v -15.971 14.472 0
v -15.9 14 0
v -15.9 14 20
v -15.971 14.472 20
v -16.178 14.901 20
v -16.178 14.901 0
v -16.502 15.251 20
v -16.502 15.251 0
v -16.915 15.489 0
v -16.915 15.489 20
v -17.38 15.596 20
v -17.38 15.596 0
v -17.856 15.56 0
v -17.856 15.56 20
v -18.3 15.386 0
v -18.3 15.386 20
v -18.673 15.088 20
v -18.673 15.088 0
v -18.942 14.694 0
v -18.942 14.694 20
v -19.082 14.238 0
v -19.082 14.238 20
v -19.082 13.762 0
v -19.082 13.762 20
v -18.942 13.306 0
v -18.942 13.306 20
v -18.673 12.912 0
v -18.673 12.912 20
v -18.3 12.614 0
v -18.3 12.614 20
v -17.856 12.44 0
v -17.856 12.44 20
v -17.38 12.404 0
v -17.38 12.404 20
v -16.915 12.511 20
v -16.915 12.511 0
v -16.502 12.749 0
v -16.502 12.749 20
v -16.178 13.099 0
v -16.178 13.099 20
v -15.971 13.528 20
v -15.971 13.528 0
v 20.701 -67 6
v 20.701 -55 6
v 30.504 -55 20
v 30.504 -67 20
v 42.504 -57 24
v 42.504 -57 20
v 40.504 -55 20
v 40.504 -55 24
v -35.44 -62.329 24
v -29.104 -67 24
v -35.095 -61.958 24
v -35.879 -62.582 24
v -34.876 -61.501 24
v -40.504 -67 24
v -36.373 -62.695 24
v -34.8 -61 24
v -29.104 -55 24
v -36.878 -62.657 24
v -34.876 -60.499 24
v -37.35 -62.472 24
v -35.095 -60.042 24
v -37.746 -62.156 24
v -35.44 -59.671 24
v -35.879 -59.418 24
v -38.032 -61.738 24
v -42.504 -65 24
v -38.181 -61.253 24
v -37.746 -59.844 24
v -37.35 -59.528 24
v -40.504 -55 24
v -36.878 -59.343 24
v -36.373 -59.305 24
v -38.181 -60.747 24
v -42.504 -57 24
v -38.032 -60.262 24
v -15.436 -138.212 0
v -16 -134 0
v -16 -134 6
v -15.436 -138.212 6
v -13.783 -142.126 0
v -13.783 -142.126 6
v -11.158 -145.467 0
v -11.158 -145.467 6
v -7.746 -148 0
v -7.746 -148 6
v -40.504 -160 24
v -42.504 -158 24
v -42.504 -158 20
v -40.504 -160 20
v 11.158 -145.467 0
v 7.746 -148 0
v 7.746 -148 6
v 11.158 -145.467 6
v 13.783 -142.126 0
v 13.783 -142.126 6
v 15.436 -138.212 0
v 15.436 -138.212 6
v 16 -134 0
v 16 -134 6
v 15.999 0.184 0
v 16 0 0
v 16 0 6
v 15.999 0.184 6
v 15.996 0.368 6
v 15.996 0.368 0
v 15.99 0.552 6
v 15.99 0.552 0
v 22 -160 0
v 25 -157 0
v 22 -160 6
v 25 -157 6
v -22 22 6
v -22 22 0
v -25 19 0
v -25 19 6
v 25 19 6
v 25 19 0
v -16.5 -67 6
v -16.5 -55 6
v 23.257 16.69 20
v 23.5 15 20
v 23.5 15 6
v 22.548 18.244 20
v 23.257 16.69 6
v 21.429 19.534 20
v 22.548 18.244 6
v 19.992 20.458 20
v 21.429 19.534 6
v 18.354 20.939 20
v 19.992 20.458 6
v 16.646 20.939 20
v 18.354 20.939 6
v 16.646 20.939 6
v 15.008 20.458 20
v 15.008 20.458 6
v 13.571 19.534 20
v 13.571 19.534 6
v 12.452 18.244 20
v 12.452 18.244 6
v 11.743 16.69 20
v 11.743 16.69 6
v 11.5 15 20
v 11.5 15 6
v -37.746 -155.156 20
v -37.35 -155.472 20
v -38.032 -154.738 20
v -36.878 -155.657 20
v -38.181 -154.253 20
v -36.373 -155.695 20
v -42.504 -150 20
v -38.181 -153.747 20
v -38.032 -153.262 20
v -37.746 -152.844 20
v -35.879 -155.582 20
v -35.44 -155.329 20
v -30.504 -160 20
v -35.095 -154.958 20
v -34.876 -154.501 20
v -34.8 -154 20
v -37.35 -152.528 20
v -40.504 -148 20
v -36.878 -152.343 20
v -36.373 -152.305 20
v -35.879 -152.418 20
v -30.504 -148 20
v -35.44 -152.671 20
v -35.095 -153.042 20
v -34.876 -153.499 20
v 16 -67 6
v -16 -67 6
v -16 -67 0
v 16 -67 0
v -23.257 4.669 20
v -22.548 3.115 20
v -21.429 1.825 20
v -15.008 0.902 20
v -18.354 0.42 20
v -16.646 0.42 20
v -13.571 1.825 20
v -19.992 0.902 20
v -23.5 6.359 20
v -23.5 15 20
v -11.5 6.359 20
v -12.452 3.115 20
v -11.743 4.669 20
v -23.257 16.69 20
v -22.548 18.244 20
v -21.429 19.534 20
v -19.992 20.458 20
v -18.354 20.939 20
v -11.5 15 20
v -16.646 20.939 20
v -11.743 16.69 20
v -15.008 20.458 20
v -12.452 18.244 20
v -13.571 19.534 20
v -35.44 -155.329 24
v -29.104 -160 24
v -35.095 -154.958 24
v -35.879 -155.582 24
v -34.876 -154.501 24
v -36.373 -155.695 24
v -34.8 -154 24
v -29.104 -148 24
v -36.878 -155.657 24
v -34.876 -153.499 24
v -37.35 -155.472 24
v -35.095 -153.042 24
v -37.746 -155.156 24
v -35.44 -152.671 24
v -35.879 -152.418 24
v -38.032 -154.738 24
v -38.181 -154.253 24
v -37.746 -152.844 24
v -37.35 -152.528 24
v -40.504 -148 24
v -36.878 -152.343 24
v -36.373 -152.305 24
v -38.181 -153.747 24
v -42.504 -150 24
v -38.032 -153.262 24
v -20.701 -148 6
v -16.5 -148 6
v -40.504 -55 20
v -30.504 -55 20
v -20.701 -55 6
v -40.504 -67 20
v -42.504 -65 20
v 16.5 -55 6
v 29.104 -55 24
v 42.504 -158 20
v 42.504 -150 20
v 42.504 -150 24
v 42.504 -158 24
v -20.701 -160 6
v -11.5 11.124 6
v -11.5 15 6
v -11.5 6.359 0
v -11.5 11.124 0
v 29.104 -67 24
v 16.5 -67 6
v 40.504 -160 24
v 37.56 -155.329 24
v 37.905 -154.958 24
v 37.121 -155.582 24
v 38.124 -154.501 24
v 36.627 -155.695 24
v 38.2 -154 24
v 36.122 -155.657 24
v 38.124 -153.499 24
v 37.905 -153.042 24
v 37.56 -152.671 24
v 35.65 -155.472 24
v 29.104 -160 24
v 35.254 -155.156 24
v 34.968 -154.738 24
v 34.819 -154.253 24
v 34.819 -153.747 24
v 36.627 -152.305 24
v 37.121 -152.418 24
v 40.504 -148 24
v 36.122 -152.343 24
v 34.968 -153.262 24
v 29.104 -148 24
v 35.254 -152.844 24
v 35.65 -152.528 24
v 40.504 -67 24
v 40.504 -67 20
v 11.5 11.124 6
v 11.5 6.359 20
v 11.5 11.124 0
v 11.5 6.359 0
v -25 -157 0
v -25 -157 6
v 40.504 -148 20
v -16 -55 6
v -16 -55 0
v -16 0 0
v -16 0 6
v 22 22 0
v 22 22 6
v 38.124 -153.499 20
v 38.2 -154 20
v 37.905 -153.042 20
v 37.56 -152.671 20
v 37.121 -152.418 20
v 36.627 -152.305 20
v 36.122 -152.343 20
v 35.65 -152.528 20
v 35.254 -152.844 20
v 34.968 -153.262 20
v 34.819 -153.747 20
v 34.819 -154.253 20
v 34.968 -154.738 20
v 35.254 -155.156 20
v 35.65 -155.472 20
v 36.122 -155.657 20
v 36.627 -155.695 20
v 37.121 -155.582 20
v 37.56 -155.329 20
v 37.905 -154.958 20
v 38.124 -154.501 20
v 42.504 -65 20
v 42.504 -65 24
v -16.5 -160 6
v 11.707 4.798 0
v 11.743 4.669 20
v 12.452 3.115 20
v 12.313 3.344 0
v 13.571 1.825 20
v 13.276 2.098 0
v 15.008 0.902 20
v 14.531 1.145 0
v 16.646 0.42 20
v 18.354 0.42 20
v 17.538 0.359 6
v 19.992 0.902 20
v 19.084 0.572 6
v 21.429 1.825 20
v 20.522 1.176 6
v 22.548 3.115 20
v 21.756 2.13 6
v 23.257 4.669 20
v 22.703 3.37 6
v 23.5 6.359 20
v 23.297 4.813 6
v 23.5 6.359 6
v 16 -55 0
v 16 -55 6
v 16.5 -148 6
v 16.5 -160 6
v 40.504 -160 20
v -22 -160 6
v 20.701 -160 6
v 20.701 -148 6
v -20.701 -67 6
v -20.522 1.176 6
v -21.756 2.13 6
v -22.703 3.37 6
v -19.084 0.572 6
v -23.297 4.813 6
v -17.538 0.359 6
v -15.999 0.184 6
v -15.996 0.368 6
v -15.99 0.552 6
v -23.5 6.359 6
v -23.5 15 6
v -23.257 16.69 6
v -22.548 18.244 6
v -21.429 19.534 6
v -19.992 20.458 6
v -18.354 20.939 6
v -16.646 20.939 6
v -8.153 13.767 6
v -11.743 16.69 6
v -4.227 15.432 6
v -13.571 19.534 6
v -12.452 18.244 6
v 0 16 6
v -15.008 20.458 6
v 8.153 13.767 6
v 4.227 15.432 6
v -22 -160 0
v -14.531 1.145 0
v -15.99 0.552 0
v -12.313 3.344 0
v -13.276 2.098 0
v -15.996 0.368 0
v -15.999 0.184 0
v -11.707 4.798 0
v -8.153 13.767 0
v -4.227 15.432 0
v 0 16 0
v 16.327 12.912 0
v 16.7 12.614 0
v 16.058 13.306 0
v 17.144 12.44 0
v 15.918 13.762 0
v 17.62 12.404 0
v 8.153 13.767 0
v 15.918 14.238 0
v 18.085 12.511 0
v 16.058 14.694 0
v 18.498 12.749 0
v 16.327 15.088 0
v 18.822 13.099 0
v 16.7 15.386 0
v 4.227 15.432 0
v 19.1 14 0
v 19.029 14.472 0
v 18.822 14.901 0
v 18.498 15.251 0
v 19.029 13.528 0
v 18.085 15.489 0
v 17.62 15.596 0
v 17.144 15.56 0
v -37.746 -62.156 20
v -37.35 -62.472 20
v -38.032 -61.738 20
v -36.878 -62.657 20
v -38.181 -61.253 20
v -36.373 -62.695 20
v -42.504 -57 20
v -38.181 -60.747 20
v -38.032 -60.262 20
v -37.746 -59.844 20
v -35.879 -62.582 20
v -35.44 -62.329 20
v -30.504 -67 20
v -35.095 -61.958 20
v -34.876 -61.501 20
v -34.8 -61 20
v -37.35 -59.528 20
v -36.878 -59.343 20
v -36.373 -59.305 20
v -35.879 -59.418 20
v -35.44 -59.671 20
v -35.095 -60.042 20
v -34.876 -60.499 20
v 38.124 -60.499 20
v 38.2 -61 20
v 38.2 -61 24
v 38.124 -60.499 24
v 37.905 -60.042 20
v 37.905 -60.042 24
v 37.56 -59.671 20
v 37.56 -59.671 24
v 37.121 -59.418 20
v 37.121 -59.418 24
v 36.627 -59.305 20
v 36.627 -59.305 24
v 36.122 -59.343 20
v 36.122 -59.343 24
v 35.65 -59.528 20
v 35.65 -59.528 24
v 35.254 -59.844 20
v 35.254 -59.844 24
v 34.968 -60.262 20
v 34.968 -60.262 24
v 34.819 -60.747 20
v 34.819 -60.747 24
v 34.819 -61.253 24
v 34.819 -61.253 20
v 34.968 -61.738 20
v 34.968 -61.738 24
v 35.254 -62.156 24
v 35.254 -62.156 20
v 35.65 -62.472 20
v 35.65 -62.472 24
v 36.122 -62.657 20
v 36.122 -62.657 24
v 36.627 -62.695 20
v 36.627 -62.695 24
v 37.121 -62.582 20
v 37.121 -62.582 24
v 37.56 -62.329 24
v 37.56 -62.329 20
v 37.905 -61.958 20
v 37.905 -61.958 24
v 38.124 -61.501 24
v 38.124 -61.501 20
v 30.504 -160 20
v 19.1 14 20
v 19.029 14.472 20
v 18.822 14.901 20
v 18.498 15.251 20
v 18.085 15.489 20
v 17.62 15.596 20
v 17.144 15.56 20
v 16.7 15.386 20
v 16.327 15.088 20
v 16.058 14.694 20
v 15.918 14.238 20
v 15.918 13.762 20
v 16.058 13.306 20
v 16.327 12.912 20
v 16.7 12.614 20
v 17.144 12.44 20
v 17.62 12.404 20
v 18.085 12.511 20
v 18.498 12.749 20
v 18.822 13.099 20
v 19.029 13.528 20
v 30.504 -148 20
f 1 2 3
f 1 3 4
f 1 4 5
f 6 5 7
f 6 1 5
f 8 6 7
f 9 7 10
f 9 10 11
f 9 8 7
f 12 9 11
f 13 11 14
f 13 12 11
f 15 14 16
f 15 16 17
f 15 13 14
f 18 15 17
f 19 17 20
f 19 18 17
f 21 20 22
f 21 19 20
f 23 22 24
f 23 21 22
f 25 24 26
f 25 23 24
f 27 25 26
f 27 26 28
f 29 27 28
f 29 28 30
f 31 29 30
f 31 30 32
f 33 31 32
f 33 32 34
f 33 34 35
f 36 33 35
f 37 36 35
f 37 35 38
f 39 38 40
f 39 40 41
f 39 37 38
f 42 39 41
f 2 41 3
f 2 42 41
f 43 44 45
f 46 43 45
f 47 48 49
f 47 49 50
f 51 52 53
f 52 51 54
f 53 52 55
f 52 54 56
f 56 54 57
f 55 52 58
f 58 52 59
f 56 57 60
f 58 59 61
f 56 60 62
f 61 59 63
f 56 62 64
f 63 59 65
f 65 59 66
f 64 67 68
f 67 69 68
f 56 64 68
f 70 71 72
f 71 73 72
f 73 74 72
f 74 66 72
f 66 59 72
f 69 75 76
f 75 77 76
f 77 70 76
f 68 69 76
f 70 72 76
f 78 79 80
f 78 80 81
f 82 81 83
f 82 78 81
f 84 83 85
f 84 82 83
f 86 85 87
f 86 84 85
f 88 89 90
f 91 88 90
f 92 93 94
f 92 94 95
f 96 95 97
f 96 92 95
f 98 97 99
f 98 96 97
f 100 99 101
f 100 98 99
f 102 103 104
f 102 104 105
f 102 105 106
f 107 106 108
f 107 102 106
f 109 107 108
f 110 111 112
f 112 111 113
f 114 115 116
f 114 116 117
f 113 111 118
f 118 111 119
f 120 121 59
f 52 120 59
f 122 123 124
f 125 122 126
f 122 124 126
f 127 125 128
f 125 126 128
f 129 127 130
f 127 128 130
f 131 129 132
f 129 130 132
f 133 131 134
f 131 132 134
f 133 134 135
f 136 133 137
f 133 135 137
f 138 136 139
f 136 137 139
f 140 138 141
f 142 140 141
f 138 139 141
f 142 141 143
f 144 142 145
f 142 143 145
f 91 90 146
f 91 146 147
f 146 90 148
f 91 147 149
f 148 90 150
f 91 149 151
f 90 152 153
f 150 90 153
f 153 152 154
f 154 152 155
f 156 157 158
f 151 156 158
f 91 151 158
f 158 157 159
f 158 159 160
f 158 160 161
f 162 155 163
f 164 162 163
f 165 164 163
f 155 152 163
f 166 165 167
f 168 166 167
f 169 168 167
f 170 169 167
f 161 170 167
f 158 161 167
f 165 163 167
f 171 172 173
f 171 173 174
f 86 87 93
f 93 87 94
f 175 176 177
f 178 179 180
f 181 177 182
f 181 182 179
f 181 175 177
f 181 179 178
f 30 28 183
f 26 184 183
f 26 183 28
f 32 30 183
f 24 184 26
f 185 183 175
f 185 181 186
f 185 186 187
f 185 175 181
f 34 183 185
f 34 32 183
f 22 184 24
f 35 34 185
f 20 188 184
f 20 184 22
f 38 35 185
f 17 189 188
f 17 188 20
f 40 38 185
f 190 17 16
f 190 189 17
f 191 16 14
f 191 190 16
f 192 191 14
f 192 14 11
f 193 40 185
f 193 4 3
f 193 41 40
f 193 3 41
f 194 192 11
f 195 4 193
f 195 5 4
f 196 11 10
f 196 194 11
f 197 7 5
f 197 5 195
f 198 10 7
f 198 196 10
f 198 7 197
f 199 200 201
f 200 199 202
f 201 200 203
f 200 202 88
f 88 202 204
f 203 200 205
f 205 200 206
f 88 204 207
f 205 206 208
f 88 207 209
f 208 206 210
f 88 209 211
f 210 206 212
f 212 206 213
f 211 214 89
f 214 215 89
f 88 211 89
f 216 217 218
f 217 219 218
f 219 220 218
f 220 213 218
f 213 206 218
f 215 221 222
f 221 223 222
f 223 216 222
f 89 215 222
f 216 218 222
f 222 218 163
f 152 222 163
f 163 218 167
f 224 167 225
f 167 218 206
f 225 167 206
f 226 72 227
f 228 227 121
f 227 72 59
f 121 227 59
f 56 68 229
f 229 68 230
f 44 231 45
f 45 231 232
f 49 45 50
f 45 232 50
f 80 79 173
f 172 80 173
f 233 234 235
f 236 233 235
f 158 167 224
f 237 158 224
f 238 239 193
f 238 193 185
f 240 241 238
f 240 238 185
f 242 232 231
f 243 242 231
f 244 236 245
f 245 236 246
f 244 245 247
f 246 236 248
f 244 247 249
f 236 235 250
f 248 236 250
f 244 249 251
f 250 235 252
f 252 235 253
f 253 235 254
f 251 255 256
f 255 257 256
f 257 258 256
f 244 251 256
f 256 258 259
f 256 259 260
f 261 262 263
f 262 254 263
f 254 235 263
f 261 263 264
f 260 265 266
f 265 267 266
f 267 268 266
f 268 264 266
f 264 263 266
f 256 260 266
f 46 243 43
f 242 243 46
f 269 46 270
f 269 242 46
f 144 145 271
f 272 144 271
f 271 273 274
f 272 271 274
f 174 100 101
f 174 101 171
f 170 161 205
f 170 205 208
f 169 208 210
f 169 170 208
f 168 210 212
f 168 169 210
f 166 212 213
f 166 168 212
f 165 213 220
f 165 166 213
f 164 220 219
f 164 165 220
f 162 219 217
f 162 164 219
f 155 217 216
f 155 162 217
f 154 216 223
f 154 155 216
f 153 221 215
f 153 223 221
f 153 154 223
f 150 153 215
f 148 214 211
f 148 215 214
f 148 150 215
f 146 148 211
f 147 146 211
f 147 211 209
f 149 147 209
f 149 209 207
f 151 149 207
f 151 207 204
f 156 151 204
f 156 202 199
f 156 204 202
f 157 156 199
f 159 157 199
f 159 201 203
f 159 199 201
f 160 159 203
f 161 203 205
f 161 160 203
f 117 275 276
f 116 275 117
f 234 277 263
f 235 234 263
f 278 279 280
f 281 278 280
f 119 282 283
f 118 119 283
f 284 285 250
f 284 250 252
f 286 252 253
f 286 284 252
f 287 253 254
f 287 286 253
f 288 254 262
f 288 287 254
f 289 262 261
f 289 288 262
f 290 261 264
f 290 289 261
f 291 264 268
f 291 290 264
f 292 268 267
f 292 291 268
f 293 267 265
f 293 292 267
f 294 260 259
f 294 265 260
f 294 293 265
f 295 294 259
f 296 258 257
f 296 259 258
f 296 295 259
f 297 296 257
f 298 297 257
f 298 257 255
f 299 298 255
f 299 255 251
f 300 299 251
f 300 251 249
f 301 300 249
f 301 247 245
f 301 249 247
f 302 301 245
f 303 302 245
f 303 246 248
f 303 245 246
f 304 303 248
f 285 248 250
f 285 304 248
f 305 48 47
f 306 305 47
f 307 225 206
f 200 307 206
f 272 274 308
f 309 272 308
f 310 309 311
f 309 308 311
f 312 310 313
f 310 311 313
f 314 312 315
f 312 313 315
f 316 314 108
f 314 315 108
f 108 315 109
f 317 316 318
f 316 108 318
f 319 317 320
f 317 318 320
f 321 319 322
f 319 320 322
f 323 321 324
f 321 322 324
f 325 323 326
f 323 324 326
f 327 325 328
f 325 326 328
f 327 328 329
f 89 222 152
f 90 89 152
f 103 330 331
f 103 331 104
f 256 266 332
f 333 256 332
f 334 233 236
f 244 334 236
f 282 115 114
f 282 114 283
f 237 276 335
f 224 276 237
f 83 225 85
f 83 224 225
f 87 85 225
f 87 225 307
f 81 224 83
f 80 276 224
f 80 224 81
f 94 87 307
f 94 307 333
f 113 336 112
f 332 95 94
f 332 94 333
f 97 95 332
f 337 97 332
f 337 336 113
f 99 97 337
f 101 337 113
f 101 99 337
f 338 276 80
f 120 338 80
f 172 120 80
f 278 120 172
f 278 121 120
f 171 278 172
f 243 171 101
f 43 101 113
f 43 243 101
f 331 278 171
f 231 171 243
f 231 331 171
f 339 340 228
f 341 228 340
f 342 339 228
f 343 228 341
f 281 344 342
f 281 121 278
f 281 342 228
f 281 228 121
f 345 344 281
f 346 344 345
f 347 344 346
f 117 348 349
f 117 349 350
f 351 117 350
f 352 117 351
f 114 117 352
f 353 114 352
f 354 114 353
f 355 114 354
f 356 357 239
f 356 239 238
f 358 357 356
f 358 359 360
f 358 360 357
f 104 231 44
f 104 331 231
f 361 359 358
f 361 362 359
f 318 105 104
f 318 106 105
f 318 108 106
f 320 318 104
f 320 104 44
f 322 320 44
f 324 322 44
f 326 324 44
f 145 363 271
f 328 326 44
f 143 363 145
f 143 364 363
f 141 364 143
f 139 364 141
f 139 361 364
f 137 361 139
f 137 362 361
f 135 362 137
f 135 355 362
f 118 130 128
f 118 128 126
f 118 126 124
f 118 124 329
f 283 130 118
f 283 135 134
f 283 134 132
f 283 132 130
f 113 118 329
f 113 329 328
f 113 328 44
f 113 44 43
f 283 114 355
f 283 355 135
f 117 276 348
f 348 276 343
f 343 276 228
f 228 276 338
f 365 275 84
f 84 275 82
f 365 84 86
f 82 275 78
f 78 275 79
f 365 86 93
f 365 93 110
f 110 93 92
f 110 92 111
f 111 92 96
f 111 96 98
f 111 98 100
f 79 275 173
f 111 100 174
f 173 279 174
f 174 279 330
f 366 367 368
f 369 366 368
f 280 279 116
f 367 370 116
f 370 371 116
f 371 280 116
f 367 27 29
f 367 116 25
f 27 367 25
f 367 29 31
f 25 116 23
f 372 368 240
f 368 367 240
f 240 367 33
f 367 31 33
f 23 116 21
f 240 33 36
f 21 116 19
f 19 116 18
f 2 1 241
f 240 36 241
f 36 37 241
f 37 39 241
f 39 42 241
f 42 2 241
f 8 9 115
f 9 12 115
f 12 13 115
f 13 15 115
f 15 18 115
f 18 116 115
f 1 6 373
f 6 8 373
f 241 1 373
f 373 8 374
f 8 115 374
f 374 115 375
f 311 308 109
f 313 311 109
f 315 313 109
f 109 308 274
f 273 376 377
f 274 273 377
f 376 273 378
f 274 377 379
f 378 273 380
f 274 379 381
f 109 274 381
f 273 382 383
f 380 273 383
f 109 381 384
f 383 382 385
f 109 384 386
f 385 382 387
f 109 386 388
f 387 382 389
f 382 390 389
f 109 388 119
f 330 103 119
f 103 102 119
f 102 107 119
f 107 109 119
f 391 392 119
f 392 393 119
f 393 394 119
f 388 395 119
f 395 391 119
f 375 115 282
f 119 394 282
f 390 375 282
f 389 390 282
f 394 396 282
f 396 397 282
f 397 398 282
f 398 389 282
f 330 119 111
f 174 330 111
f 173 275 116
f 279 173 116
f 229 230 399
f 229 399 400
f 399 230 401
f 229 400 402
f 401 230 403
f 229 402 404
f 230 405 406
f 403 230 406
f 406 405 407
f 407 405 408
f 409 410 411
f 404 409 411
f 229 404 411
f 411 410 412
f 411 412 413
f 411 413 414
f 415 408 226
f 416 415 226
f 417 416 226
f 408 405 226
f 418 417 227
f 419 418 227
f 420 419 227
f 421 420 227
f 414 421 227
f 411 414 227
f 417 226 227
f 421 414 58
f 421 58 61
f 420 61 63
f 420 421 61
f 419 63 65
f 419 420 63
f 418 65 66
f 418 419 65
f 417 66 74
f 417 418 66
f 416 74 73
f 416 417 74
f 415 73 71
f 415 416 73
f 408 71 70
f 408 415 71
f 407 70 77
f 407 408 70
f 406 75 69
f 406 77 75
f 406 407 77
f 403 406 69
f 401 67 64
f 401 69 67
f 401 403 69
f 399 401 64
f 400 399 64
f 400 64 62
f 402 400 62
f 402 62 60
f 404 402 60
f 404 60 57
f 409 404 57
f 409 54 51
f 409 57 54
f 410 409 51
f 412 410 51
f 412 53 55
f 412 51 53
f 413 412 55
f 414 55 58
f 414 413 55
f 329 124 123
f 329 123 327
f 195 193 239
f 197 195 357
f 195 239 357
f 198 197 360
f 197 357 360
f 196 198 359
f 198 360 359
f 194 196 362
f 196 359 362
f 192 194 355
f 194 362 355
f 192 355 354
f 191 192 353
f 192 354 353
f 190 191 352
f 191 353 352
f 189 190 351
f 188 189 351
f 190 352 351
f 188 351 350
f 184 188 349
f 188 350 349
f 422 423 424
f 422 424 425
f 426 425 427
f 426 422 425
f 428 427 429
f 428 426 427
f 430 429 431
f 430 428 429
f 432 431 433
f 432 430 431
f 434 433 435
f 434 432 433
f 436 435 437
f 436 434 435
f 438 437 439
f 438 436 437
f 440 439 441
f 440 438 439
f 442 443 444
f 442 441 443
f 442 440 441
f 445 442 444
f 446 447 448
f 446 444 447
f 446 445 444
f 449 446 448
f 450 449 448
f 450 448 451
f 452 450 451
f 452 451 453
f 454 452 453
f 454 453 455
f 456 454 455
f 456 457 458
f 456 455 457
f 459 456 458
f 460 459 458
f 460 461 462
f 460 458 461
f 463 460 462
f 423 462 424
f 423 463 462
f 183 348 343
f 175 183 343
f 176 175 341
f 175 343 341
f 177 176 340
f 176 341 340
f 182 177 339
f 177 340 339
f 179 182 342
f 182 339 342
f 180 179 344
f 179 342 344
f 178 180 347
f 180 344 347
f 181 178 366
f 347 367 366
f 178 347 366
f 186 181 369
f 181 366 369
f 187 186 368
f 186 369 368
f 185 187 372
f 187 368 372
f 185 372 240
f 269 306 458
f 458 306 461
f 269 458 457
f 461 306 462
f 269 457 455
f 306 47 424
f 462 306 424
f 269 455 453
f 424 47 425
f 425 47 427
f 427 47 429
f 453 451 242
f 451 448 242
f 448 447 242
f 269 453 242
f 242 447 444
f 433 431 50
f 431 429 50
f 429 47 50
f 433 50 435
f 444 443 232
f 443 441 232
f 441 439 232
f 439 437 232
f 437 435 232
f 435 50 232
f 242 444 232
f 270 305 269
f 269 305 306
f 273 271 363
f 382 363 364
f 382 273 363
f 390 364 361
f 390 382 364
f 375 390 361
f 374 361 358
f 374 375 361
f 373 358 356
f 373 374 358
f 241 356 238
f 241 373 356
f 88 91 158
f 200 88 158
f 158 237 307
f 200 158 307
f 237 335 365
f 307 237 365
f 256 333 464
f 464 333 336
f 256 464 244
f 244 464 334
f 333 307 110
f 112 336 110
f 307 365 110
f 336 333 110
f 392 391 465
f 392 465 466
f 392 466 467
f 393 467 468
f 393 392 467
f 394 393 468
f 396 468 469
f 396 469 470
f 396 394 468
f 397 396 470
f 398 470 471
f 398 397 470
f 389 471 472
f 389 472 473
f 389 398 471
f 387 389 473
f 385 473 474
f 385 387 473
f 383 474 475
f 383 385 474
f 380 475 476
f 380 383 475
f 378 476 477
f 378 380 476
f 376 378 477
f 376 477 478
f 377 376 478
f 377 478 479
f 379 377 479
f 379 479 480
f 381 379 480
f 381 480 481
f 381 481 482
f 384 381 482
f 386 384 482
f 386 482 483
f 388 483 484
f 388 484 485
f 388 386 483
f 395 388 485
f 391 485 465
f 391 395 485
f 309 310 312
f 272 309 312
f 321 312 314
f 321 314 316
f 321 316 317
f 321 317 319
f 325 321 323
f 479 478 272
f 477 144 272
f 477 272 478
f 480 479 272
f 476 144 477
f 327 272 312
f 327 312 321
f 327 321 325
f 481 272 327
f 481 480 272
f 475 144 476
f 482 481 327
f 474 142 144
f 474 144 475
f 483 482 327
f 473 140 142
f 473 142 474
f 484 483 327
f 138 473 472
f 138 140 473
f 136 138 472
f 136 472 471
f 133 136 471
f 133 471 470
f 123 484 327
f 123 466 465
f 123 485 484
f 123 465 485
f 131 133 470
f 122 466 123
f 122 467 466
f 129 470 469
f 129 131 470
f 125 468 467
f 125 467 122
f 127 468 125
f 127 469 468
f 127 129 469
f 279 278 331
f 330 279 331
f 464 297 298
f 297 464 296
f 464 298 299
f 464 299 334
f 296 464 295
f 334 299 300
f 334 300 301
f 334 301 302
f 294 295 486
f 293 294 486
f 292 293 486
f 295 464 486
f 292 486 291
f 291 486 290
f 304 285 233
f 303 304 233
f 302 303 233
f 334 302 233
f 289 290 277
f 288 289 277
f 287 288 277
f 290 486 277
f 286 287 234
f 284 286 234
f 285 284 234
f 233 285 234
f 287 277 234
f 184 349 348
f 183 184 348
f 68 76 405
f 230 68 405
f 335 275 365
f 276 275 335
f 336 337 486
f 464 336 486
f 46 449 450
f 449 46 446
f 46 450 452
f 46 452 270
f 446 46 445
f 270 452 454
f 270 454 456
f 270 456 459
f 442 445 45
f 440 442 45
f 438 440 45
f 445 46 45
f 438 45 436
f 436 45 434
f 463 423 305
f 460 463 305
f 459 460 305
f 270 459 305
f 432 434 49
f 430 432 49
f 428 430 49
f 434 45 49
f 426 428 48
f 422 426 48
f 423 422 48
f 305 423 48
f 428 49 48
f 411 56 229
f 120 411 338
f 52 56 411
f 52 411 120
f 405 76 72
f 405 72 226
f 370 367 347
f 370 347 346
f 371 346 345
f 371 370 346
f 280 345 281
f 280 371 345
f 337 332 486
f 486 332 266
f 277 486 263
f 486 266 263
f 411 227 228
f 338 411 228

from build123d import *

# Parameters (mm, degrees)
SKETCH004_W     = 50
SKETCH004_H     = 182
PAD003_DEPTH    = 6
PAD010_DEPTH    = 20
SKETCH015_R     = 1.6
POCKET_DEPTH    = 20
PAD_DEPTH       = 12
PAD018_DEPTH    = 12
SKETCH019_R     = 1.7
HOLE_DEPTH      = 40
CHAMFER002_SIZE = 2
CHAMFER_SIZE    = 3


with BuildPart() as part:
    # Sketch004 → Pad003 (new body)
    with BuildSketch(Plane.XY):
        with Locations((0, -69)):
            Rectangle(SKETCH004_W, SKETCH004_H)
        with BuildLine():
            ThreePointArc((-16, -134), (0, -150), (16, -134))
            Line((16, -134), (16, 0))
            ThreePointArc((16, 0), (0, 16), (-16, 0))
            Line((-16, -134), (-16, 0))
        make_face(mode=Mode.SUBTRACT)
    extrude(amount=PAD003_DEPTH)

    # Sketch016 → Pad010 (join)
    with BuildSketch(Plane.XY):
        with BuildLine():
            ThreePointArc((-11.5, 15), (-17.5, 21), (-23.5, 15))
            Line((-23.5, 15), (-23.5, 6.359301))
            ThreePointArc((-23.5, 6.359301), (-17.5, 0.359301), (-11.5, 6.359301))
            Line((-11.5, 15), (-11.5, 6.359301))
        make_face()
        with BuildLine():
            ThreePointArc((23.5, 15), (17.5, 21), (11.5, 15))
            Line((11.5, 15), (11.5, 6.359301))
            ThreePointArc((11.5, 6.359301), (17.5, 0.359301), (23.5, 6.359301))
            Line((23.5, 15), (23.5, 6.359301))
        make_face()
    extrude(amount=PAD010_DEPTH)

    # Sketch015 → Pocket (cut)
    with BuildSketch(Plane.XY):
        with Locations((-17.5, 14)):
            Circle(SKETCH015_R)
        with Locations((17.5, 14)):
            Circle(SKETCH015_R)
    extrude(amount=POCKET_DEPTH, mode=Mode.SUBTRACT)

    # Sketch018 → Pad (join)
    with BuildSketch(Plane.XZ.offset(148)):
        Polygon((-16.5, 0), (16.5, 0), (30.504151, 20), (42.504151, 20), (42.504151, 24), (29.103736, 24), (16.5, 6), (-16.5, 6), (-29.103736, 24), (-42.504151, 24), (-42.504151, 20), (-30.504151, 20), align=None)
    extrude(amount=PAD_DEPTH)

    # Sketch034 → Pad018 (join)
    with BuildSketch(Plane.XZ.offset(55)):
        Polygon((-16.5, 0), (16.5, 0), (30.504151, 20), (42.504151, 20), (42.504151, 24), (29.103736, 24), (16.5, 6), (-16.5, 6), (-29.103736, 24), (-42.504151, 24), (-42.504151, 20), (-30.504151, 20), align=None)
    extrude(amount=PAD018_DEPTH)

    # Sketch019 → Hole (cut)
    with BuildSketch(Plane.XY):
        with Locations((-36.5, -154)):
            Circle(SKETCH019_R)
        with Locations((36.5, -154)):
            Circle(SKETCH019_R)
        with Locations((-36.5, -61)):
            Circle(SKETCH019_R)
        with Locations((36.5, -61)):
            Circle(SKETCH019_R)
    extrude(amount=HOLE_DEPTH, mode=Mode.SUBTRACT)

    # Chamfer002
    chamfer002_edges = [part.edges().sort_by_distance(p)[0] for p in [
        (-42.504151, -160, 22),
        (-42.504151, -148, 22),
        (42.504151, -160, 22),
        (42.504151, -148, 22),
        (-42.504151, -67, 22),
        (-42.504151, -55, 22),
        (42.504151, -67, 22),
        (42.504151, -55, 22),
    ]]
    chamfer(chamfer002_edges, length=CHAMFER002_SIZE)

    # Chamfer
    chamfer_edges = [part.edges().sort_by_distance(p)[0] for p in [
        (-25, -160, 3),
        (25, -160, 3),
        (25, 22, 3),
        (-25, 22, 3),
    ]]
    chamfer(chamfer_edges, length=CHAMFER_SIZE)


solid = part.part
